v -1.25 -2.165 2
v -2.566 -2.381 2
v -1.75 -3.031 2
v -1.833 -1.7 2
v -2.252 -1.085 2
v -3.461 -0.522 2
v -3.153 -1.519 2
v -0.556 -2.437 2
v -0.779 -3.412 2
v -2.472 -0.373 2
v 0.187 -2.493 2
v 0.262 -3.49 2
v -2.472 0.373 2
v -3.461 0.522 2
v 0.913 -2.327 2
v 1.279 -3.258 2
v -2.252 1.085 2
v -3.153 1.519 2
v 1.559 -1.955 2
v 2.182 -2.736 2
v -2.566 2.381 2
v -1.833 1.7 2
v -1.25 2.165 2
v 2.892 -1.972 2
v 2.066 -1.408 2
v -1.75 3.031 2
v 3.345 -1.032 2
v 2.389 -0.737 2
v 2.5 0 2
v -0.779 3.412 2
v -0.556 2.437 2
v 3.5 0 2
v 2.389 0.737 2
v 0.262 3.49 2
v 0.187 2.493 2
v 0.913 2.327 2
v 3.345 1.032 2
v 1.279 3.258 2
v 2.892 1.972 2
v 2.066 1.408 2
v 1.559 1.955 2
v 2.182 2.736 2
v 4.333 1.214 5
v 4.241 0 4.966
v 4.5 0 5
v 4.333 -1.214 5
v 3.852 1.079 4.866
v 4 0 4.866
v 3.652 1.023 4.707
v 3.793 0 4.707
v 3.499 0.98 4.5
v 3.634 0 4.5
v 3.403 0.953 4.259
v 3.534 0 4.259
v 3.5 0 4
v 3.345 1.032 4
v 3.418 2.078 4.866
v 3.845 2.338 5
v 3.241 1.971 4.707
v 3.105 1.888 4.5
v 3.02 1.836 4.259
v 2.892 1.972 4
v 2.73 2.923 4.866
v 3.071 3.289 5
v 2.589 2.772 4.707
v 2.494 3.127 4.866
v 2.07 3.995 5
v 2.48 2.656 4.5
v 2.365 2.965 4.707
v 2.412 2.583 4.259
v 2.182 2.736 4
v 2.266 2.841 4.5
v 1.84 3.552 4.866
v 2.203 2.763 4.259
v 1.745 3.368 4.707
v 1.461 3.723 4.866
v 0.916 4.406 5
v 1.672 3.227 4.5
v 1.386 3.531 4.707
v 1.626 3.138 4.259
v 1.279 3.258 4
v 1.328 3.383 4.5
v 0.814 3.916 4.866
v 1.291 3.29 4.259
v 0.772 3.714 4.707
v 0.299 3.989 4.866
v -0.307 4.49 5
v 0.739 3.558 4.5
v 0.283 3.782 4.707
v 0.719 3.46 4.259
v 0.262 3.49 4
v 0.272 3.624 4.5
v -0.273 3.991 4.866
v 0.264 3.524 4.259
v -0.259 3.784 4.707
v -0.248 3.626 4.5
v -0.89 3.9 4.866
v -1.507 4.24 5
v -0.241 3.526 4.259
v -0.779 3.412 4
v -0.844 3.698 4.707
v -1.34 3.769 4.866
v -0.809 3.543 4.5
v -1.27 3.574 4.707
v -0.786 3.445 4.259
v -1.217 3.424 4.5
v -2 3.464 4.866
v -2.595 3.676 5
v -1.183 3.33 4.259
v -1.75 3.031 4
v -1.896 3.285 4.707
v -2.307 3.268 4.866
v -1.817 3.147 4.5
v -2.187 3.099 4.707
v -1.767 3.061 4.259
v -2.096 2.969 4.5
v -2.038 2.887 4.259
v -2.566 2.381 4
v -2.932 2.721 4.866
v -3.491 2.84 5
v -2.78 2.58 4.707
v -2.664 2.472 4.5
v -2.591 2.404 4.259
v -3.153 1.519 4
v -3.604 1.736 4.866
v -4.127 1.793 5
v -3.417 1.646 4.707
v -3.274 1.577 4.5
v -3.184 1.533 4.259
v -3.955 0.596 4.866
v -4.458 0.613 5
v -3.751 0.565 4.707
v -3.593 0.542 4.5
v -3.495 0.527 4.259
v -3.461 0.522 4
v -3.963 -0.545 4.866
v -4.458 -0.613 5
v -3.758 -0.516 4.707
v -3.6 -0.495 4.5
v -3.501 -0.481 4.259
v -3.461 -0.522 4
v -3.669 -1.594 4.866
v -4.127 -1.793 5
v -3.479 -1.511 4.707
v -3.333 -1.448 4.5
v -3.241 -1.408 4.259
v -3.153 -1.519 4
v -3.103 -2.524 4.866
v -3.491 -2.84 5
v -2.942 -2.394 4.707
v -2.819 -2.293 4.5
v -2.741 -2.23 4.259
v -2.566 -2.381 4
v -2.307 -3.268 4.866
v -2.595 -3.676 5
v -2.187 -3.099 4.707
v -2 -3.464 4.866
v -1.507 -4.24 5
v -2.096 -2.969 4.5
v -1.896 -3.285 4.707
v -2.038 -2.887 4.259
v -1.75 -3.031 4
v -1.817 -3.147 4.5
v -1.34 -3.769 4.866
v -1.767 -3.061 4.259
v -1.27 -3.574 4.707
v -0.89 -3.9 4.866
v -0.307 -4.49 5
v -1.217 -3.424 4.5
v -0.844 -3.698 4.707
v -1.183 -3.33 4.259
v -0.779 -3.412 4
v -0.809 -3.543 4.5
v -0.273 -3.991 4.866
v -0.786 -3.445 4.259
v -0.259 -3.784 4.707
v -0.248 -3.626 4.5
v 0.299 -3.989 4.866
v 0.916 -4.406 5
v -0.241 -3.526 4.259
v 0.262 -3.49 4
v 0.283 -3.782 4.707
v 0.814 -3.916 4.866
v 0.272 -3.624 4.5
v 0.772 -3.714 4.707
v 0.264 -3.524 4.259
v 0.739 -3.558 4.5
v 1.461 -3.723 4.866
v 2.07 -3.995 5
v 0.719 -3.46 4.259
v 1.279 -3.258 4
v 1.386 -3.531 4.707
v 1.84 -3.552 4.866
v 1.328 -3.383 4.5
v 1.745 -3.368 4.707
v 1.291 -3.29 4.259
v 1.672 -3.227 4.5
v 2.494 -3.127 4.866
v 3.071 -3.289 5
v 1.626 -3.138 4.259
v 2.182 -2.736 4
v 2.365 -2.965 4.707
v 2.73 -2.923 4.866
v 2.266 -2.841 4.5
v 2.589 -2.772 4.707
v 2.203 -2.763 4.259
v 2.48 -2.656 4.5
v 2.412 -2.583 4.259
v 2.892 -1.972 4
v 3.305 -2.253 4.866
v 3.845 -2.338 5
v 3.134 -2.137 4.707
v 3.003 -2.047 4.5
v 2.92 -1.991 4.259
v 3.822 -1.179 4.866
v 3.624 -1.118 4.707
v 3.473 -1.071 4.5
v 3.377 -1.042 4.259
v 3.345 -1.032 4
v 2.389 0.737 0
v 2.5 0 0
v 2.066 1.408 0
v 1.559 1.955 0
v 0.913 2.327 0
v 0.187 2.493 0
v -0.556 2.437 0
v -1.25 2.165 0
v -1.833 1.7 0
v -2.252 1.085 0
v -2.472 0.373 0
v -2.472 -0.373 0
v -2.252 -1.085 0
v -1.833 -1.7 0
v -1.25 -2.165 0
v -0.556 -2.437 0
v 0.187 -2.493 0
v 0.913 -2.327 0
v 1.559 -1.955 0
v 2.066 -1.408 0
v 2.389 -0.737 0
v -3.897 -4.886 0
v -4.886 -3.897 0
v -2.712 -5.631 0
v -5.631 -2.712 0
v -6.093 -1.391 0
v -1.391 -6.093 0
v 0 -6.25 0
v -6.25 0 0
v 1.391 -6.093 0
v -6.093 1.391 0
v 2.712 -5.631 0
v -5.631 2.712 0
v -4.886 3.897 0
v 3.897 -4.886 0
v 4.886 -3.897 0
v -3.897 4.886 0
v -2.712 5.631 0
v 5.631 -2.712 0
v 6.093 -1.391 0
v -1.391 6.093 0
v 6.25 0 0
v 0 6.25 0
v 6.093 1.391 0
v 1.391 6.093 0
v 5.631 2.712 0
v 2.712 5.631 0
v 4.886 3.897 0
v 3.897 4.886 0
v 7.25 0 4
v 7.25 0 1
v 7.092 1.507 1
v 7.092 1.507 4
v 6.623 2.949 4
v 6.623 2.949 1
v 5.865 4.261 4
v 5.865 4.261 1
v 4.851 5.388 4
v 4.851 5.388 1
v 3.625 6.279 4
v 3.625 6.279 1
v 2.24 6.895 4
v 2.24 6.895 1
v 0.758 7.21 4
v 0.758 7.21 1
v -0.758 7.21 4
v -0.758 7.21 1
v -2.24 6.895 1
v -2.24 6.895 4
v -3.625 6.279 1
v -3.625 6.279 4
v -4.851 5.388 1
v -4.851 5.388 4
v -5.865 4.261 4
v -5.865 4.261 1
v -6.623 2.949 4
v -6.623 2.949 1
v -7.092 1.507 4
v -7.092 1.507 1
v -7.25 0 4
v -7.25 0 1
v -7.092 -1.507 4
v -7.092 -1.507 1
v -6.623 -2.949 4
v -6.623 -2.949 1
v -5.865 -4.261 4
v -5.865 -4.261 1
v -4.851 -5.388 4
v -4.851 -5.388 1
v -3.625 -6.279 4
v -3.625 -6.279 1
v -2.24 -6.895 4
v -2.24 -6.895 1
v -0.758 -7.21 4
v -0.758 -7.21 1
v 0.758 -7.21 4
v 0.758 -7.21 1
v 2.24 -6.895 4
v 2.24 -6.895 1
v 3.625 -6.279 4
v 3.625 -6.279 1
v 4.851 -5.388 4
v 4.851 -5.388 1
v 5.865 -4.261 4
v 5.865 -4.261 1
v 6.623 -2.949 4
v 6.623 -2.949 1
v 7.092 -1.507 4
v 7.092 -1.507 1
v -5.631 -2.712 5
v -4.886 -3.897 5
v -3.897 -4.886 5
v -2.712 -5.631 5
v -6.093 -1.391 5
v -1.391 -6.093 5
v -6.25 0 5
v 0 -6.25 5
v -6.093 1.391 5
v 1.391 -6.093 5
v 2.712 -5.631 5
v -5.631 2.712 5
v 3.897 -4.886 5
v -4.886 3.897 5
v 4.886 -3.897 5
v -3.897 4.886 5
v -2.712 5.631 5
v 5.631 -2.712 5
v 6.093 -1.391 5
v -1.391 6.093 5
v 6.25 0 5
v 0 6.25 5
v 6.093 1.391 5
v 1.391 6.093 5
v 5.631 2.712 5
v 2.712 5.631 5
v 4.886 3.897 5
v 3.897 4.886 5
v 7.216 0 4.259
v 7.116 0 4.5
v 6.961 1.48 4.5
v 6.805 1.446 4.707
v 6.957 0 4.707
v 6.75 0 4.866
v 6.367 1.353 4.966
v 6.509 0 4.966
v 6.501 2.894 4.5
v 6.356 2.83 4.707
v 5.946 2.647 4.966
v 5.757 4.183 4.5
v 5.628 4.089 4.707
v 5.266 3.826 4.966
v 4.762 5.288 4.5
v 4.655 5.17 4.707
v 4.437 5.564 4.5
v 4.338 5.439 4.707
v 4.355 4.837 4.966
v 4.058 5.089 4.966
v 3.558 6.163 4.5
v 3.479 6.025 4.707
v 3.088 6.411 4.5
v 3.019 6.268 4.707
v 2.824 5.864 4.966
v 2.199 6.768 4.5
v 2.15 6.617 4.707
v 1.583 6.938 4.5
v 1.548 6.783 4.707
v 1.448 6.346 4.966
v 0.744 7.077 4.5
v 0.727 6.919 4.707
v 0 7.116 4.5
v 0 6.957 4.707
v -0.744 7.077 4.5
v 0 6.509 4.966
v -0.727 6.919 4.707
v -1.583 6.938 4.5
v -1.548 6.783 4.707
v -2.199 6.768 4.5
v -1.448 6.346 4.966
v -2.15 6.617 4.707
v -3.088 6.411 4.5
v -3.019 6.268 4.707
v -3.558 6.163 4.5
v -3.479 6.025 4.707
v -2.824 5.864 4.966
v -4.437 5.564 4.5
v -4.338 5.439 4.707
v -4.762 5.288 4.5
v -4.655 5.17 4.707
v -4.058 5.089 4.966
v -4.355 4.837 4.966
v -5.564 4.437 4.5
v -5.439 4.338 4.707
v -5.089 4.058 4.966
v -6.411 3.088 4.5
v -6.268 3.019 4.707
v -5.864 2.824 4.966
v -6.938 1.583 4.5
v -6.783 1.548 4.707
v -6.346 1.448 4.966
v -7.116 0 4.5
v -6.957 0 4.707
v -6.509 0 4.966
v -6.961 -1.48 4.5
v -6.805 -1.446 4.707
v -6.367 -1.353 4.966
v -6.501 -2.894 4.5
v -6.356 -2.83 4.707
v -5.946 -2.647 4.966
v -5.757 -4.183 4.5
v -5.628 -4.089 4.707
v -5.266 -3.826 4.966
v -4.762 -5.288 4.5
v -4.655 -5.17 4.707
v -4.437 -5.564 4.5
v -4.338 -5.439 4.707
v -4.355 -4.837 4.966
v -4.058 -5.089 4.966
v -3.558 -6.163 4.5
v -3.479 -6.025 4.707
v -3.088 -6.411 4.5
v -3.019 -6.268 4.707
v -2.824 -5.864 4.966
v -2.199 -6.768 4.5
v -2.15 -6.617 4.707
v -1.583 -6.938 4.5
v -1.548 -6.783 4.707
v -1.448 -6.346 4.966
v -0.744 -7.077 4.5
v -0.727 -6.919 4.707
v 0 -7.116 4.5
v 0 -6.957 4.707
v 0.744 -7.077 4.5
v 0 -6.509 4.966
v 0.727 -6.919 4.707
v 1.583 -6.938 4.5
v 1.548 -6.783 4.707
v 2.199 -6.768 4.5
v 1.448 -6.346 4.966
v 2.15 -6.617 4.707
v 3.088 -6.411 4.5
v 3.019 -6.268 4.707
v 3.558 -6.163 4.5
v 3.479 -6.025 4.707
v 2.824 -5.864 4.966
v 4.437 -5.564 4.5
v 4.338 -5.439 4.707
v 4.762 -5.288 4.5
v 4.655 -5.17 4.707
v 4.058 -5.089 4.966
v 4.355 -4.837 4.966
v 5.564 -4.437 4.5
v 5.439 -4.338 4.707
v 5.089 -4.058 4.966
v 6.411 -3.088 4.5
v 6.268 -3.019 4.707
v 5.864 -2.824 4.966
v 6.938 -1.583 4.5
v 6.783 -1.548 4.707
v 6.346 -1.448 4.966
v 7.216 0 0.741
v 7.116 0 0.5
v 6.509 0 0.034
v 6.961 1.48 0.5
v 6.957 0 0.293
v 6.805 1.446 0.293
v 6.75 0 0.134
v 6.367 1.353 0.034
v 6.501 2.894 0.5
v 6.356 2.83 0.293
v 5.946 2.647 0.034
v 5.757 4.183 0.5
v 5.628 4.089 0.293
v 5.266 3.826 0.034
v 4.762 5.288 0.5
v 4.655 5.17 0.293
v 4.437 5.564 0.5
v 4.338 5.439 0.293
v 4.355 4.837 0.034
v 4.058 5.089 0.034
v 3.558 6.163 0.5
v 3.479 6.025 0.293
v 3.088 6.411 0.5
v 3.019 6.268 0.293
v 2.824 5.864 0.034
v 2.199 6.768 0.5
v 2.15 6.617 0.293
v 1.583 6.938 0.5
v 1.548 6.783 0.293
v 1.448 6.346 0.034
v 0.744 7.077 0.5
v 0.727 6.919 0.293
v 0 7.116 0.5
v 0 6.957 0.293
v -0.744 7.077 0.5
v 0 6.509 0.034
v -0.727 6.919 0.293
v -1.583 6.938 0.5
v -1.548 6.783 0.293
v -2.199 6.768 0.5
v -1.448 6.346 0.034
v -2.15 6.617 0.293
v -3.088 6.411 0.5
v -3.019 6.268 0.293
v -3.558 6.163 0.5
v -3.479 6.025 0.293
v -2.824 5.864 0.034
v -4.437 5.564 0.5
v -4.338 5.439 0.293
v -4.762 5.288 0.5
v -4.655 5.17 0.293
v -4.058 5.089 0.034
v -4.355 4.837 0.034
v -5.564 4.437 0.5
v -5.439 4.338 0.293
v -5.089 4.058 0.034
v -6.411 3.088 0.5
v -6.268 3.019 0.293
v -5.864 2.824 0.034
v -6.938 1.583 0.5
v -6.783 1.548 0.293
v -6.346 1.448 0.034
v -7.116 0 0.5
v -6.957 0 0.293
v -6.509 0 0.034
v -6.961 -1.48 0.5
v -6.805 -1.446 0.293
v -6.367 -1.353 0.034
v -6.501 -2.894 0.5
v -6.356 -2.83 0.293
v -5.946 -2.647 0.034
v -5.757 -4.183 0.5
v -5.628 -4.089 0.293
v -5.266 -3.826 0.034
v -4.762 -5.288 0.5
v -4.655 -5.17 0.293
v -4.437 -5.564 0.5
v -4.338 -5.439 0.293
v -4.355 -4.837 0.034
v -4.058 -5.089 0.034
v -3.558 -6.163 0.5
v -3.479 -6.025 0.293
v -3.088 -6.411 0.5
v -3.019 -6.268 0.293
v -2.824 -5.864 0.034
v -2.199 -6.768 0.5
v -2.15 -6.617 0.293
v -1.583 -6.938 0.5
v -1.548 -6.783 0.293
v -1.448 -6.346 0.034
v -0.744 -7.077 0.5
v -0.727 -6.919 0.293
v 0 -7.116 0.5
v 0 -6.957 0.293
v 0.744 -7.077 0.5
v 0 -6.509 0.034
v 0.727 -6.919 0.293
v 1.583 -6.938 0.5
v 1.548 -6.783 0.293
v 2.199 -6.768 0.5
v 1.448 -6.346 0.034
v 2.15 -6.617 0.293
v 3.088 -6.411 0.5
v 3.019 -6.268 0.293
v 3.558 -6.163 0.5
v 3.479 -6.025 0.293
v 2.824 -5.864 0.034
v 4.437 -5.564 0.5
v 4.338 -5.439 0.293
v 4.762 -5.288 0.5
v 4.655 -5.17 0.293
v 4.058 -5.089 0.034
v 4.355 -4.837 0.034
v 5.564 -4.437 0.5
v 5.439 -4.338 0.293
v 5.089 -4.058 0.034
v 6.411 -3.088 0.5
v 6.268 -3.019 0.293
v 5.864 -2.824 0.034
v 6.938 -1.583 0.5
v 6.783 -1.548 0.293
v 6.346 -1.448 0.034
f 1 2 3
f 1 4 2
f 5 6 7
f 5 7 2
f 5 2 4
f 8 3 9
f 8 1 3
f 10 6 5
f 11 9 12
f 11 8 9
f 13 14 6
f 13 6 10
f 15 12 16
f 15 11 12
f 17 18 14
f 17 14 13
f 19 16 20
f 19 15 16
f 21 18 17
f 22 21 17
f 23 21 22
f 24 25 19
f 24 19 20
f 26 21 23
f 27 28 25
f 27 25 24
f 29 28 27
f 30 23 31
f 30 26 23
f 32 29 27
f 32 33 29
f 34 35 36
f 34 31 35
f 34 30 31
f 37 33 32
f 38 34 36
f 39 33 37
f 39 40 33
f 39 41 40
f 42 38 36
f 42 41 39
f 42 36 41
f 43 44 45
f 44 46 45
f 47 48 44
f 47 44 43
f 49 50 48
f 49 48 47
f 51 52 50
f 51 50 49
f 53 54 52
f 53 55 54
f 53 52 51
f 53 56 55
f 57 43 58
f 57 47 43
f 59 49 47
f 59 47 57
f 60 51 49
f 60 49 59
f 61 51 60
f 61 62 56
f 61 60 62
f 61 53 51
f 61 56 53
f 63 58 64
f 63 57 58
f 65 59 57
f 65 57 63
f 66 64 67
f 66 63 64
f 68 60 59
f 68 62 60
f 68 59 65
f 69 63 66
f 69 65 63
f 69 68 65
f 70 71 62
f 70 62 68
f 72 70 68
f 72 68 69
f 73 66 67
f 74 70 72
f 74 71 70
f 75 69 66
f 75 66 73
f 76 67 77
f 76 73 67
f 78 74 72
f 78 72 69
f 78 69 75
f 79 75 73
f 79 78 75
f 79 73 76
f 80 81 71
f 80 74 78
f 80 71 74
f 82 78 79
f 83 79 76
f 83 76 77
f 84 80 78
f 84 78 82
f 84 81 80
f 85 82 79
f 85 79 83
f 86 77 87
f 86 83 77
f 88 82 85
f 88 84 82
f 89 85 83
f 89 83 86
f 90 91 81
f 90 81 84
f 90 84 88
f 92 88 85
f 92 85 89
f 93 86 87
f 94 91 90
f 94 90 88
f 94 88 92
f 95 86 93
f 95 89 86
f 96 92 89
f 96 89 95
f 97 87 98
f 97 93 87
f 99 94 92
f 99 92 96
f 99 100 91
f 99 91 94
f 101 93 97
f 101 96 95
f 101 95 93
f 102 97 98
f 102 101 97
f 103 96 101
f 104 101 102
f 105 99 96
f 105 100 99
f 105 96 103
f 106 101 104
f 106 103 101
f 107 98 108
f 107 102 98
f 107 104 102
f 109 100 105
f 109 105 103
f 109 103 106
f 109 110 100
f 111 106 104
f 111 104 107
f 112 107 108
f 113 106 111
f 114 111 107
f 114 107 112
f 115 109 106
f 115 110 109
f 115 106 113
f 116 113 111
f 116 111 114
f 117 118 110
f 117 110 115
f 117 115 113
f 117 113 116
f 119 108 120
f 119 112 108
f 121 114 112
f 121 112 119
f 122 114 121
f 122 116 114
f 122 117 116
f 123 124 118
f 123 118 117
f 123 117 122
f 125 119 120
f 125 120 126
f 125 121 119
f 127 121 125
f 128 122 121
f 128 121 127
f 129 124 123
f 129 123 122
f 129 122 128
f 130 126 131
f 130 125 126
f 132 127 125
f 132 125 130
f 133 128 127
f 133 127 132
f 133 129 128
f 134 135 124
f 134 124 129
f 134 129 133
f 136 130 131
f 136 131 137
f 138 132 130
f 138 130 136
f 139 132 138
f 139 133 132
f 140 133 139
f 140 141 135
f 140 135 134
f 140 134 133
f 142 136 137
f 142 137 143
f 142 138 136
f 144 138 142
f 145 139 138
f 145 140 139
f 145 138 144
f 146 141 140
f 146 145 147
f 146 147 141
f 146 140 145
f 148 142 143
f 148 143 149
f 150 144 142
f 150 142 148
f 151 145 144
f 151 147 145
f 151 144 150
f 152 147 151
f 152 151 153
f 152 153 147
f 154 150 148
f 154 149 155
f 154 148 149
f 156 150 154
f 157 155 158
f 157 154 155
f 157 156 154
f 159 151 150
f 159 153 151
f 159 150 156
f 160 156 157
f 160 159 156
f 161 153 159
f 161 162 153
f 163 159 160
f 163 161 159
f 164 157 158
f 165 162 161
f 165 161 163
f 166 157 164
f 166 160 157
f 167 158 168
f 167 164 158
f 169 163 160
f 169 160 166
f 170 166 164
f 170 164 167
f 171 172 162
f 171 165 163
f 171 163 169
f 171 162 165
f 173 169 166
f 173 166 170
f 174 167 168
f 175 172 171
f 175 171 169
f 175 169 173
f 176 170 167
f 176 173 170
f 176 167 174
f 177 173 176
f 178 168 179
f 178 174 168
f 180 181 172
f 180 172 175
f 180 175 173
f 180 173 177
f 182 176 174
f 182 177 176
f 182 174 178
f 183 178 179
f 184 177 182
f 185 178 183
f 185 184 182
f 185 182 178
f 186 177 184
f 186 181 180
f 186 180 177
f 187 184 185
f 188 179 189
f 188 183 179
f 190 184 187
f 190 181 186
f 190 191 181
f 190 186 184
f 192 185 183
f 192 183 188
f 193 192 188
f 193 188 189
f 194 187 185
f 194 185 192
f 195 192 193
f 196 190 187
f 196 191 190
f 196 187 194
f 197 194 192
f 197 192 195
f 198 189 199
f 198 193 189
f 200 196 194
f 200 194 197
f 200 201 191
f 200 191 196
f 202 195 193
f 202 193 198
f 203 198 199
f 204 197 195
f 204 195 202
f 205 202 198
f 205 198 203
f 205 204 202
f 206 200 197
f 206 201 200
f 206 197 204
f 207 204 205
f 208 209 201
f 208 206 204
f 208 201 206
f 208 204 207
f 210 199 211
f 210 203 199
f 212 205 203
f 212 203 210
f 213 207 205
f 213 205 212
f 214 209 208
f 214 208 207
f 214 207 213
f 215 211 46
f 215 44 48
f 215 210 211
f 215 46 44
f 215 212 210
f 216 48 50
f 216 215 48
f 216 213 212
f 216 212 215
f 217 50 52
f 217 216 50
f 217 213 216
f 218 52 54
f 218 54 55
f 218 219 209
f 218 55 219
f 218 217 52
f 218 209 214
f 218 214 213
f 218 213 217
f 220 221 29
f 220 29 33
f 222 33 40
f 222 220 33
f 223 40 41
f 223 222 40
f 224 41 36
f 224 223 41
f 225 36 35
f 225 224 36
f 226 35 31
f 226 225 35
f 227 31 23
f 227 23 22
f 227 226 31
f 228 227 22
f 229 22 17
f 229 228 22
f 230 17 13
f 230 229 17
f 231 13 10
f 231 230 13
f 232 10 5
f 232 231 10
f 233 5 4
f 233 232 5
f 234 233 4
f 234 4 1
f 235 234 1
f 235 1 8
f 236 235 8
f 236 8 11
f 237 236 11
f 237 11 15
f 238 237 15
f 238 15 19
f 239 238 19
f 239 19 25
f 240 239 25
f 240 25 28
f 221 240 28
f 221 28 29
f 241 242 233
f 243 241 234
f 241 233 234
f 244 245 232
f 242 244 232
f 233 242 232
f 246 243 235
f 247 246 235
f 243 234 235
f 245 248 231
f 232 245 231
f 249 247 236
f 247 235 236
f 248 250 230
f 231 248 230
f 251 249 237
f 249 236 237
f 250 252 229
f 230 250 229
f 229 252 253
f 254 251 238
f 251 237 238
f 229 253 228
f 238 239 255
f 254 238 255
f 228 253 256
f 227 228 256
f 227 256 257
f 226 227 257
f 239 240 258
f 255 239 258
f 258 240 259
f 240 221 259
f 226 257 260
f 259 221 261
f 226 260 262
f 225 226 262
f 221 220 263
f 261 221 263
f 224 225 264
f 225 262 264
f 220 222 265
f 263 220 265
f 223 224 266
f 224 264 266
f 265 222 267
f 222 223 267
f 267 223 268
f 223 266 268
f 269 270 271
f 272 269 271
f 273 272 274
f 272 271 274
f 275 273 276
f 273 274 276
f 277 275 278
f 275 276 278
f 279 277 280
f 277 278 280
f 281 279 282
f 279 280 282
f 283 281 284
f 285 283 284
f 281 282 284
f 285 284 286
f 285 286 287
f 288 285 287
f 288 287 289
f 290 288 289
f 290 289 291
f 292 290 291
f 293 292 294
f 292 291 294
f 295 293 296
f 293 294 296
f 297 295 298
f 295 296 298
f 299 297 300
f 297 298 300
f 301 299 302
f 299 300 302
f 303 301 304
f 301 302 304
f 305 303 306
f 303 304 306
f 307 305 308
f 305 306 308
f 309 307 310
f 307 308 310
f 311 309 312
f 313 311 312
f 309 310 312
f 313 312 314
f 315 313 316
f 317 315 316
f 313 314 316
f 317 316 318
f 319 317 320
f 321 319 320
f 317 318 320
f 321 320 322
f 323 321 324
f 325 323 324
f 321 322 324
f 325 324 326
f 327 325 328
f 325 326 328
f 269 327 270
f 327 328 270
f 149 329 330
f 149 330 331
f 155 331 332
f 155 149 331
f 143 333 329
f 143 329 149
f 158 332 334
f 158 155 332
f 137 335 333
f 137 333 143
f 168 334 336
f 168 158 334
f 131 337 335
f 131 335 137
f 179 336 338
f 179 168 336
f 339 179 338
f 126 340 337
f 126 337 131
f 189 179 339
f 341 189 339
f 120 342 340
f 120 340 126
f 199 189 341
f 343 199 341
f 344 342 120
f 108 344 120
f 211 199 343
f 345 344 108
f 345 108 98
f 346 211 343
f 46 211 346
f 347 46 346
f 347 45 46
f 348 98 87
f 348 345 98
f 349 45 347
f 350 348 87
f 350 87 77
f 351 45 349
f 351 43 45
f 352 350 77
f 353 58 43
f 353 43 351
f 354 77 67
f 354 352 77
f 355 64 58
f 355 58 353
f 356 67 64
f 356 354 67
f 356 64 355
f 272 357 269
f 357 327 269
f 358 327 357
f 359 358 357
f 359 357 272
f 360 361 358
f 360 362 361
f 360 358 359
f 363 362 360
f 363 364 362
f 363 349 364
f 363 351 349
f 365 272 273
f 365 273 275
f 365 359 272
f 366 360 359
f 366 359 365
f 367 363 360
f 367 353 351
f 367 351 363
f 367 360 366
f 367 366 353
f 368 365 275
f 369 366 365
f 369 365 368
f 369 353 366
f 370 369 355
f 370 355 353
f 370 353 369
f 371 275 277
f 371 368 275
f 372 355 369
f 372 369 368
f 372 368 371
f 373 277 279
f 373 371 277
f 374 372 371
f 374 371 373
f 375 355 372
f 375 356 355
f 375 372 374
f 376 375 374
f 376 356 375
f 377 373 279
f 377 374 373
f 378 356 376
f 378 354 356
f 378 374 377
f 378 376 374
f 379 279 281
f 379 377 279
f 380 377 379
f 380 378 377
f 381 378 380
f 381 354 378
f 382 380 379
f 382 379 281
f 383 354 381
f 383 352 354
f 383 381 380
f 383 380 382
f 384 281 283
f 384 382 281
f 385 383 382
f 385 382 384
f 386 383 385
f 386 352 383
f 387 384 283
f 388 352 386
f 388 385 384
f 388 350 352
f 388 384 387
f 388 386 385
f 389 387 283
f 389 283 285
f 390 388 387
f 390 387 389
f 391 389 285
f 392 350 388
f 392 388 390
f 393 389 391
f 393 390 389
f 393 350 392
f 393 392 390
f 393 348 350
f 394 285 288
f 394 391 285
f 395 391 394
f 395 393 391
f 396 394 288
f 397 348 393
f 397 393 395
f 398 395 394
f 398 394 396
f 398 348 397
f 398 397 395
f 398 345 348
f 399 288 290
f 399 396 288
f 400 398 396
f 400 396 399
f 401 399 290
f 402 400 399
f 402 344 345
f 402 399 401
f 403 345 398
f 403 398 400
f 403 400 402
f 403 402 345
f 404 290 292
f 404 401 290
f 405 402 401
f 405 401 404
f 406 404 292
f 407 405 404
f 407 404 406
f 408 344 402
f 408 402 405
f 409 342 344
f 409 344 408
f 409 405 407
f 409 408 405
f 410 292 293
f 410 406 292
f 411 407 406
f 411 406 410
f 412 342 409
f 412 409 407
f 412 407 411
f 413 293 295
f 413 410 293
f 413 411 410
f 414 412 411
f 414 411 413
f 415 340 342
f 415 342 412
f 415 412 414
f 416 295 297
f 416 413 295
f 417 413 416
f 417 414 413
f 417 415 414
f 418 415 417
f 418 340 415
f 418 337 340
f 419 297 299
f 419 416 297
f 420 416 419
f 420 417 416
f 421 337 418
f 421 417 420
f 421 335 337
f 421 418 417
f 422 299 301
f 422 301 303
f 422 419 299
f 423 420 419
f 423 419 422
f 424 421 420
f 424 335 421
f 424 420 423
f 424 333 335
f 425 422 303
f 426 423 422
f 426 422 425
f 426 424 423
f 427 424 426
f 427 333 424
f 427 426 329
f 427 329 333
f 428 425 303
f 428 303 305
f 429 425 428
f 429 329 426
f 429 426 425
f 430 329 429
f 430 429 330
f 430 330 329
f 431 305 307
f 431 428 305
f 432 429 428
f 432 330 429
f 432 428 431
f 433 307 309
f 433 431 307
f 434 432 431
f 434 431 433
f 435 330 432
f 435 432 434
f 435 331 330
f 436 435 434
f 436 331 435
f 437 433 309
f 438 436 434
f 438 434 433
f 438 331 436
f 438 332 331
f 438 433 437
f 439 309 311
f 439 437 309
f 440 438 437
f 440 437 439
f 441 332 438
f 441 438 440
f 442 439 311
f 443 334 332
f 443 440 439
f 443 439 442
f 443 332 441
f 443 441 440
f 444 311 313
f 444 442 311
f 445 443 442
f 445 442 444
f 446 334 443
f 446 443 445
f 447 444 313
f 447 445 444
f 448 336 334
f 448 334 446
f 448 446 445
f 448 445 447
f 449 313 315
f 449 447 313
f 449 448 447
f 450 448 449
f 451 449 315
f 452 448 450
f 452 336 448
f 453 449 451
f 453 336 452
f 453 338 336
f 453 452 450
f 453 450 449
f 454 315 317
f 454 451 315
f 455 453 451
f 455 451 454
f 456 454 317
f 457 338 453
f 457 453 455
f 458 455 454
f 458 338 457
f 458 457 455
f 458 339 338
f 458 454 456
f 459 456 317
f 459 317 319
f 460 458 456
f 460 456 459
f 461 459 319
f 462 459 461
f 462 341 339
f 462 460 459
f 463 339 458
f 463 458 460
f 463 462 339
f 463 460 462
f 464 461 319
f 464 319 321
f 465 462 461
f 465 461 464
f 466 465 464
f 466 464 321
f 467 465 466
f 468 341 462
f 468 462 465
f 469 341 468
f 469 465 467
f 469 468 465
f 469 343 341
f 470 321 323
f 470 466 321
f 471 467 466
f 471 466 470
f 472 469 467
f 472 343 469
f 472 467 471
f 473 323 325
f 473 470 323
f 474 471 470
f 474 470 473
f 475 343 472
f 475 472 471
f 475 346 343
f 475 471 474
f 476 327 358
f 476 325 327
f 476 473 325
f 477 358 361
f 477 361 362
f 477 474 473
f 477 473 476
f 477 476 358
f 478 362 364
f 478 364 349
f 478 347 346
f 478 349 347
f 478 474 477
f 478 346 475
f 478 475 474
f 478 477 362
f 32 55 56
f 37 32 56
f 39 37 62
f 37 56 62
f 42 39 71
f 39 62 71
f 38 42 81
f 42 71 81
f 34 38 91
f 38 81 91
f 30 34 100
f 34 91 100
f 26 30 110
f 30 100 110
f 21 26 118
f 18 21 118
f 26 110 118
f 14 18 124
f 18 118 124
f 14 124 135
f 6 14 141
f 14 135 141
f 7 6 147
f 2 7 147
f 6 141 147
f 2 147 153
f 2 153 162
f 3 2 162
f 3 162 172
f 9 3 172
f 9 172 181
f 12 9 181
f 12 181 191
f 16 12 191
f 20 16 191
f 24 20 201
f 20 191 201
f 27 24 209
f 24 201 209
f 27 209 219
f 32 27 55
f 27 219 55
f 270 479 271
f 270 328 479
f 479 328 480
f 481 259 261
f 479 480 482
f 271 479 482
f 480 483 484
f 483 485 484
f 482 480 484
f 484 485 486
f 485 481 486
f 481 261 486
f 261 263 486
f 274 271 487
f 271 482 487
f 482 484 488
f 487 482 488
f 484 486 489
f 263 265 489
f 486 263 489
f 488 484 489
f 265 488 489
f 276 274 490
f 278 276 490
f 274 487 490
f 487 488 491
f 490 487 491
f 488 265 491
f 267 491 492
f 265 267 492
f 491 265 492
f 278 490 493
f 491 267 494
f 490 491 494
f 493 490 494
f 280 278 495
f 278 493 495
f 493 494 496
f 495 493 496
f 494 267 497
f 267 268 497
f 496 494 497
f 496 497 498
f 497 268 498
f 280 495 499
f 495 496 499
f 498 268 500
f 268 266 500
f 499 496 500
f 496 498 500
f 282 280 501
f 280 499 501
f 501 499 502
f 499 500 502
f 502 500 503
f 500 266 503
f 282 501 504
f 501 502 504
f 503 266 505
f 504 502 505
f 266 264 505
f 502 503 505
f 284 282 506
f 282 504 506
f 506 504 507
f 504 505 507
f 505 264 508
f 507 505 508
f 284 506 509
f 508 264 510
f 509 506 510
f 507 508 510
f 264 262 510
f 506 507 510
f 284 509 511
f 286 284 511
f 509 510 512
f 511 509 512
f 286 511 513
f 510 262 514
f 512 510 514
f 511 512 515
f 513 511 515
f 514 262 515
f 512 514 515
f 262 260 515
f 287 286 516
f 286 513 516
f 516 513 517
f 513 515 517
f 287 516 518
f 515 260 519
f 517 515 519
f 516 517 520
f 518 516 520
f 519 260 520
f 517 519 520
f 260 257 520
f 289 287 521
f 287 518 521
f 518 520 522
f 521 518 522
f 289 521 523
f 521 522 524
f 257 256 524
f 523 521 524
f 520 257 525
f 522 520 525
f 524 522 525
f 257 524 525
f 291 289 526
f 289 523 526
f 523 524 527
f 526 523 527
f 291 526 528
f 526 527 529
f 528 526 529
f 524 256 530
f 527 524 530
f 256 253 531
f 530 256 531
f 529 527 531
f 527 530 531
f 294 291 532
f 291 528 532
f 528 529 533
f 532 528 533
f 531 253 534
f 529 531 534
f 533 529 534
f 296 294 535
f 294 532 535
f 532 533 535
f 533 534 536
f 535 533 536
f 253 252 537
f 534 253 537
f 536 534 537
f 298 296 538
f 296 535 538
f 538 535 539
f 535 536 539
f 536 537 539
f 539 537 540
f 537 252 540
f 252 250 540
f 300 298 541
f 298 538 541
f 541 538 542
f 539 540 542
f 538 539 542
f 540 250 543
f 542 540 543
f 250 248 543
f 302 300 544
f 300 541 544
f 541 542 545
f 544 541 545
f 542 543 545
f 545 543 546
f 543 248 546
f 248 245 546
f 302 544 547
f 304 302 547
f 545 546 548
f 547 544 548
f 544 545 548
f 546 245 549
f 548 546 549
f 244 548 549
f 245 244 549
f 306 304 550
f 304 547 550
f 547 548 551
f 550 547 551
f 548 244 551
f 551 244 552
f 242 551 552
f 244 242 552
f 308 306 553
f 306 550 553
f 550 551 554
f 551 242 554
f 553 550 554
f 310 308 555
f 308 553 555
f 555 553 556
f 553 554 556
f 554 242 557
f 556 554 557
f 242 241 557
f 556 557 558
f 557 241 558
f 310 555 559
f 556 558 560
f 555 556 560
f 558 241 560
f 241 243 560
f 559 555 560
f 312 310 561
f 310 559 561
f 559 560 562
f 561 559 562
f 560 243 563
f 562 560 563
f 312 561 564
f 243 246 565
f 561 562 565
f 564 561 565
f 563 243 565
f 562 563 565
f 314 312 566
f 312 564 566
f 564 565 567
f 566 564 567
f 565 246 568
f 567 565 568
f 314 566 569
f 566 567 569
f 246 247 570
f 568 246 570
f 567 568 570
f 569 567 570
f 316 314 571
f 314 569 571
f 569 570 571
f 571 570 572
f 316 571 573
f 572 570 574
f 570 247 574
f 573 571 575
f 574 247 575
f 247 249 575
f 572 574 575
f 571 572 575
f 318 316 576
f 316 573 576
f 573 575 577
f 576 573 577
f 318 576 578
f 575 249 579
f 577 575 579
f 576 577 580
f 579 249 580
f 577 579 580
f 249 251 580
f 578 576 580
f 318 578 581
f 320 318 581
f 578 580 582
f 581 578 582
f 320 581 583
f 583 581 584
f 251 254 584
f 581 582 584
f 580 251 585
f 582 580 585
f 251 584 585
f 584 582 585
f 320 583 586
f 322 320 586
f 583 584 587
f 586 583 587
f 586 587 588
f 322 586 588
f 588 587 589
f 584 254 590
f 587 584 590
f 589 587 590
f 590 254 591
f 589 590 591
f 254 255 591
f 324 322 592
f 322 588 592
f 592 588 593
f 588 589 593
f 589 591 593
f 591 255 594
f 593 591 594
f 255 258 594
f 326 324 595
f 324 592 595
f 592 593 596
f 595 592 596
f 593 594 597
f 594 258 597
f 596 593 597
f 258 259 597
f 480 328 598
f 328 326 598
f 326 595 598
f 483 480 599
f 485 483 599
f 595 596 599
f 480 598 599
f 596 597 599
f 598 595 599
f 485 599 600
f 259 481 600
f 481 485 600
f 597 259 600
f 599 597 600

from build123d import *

# Parameters (mm, degrees)
F0_R     = 7.25
F0_R_2   = 2.5
F1_DEPTH = 5
F2_R     = 3.5
F2_R_2   = 2.5
F3_DEPTH = 3
F4_R     = 1


with BuildPart() as f1:
    # F0 (on Top) → F1 (new body)
    with BuildSketch(Plane.XY):
        Circle(F0_R)
        Circle(F0_R_2, mode=Mode.SUBTRACT)
    extrude(amount=F1_DEPTH)

    # F2 (on face) → F3 (cut)
    with BuildSketch(Plane.XY.offset(5)):
        Circle(F2_R)
        Circle(F2_R_2, mode=Mode.SUBTRACT)
    extrude(amount=-F3_DEPTH, mode=Mode.SUBTRACT)

    # F4
    f4_edges = [f1.edges().sort_by_distance(p)[0] for p in [
        (-7.25, 0, 5),
        (-3.5, 0, 5),
        (-7.25, 0, 0),
    ]]
    fillet(f4_edges, radius=F4_R)


solid = f1.part
